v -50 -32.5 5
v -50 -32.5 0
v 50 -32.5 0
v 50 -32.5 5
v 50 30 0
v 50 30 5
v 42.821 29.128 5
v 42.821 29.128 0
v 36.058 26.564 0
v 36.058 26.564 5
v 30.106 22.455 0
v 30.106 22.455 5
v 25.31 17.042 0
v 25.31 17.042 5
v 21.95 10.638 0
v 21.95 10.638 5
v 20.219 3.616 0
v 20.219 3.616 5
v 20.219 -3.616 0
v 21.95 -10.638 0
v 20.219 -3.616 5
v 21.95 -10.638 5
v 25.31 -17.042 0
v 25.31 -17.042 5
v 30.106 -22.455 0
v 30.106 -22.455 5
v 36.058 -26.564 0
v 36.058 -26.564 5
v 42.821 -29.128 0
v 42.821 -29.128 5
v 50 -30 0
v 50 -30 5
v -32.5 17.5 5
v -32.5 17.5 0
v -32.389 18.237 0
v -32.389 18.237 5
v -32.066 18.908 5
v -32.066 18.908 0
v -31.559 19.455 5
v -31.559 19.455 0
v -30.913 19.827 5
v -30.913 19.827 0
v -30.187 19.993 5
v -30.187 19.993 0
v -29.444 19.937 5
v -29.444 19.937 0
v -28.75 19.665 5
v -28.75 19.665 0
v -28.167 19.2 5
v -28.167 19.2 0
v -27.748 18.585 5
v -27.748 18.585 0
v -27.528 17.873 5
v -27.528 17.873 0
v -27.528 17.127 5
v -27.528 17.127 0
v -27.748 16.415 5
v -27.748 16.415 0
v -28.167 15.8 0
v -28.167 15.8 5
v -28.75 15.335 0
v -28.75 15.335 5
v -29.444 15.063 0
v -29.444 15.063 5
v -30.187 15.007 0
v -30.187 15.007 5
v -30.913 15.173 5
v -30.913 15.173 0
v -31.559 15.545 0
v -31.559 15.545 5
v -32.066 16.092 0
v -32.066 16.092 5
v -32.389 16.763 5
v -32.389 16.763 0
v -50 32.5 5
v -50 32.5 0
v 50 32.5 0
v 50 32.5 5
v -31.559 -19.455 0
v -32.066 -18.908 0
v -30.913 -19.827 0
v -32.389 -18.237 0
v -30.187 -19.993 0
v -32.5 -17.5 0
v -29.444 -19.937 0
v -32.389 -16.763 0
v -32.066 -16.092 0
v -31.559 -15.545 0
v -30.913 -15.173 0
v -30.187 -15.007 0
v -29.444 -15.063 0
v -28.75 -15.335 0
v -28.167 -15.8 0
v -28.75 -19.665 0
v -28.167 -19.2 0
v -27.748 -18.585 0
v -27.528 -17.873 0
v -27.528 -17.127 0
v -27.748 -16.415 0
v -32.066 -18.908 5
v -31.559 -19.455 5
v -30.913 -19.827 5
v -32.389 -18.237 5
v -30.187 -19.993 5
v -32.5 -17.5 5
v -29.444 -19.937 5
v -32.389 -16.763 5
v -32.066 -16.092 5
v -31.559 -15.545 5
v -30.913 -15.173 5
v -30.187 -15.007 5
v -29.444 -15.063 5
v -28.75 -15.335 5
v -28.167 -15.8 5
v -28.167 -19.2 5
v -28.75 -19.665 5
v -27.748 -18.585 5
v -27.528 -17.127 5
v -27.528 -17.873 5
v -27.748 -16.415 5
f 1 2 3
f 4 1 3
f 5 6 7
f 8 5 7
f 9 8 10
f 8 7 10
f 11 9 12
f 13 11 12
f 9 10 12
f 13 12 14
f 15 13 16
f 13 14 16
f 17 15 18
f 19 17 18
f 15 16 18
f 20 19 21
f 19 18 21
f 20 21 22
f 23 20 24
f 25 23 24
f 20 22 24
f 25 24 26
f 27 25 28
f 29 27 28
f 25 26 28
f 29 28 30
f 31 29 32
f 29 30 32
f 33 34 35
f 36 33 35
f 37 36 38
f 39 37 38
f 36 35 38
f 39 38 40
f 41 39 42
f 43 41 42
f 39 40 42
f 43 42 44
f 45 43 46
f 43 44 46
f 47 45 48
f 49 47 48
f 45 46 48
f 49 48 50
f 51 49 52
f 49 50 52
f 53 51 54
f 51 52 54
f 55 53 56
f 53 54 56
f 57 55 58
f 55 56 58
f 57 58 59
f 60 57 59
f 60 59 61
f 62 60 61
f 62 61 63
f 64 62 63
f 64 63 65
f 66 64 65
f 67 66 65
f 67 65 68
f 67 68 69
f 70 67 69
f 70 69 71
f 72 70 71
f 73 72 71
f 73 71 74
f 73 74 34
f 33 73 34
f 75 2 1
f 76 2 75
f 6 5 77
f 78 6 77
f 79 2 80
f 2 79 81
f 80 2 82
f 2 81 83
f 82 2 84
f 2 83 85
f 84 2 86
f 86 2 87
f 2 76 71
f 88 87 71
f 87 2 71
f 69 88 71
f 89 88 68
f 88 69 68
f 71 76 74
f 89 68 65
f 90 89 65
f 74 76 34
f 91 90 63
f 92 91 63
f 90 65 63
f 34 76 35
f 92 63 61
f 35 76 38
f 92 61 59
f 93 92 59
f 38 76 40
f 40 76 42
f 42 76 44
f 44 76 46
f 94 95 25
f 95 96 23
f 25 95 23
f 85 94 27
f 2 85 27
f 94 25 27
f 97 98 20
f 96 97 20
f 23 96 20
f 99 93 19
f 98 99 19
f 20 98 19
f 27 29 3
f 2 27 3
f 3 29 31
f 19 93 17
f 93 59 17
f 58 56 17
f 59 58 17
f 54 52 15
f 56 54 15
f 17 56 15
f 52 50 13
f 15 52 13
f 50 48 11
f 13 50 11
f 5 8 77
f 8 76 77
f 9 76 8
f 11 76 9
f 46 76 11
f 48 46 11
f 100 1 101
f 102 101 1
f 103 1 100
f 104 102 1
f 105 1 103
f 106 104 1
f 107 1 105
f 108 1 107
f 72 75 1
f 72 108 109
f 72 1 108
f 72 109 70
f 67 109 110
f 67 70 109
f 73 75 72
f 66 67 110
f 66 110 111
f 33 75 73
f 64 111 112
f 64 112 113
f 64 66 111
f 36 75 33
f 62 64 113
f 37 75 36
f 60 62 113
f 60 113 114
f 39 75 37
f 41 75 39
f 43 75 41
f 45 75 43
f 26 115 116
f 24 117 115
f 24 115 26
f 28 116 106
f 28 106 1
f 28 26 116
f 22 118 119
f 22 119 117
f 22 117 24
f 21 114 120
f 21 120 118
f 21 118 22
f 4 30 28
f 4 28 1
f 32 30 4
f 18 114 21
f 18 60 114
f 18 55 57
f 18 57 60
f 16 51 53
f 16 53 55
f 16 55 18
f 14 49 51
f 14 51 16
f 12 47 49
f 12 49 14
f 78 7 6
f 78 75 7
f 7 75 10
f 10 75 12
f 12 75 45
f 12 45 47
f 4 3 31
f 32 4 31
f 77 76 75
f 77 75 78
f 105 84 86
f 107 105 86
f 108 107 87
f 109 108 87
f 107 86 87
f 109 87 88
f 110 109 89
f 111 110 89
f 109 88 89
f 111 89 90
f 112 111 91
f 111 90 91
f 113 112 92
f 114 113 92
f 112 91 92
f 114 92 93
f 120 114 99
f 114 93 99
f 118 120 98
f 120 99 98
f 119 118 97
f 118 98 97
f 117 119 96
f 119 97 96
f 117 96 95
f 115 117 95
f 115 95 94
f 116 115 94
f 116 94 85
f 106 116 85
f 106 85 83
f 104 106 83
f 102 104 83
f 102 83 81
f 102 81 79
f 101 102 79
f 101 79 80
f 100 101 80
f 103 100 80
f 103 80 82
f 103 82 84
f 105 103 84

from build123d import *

# Parameters (mm, degrees)
F4_W     = 100
F4_H     = 65
F0_DEPTH = 5
F2_DEPTH = 5.001
F5_D     = 5


with BuildPart() as f0:
    # F4 (on Top) → F0 (new body)
    with BuildSketch(Plane.XY):
        Rectangle(F4_W, F4_H)
    extrude(amount=F0_DEPTH)

    # F1 (on face) → F2 (cut, through all)
    with BuildSketch(Plane.XY.offset(5)):
        with BuildLine():
            ThreePointArc((50, -30), (71.2132034356, -21.2132034356), (80, 0))
            ThreePointArc((80, 0), (71.2132034356, 21.2132034356), (50, 30))
            Line((50, 30), (50, -30))
        make_face()
        with BuildLine():
            Line((50, -30), (50, 30))
            ThreePointArc((50, 30), (20, 0), (50, -30))
        make_face()
    extrude(amount=-F2_DEPTH, mode=Mode.SUBTRACT)

    # F5 (through all)
    with Locations(Plane.XY.offset(5)):
        with Locations((-30, 17.5), (-30, -17.5)):
            Hole(F5_D / 2)


solid = f0.part
